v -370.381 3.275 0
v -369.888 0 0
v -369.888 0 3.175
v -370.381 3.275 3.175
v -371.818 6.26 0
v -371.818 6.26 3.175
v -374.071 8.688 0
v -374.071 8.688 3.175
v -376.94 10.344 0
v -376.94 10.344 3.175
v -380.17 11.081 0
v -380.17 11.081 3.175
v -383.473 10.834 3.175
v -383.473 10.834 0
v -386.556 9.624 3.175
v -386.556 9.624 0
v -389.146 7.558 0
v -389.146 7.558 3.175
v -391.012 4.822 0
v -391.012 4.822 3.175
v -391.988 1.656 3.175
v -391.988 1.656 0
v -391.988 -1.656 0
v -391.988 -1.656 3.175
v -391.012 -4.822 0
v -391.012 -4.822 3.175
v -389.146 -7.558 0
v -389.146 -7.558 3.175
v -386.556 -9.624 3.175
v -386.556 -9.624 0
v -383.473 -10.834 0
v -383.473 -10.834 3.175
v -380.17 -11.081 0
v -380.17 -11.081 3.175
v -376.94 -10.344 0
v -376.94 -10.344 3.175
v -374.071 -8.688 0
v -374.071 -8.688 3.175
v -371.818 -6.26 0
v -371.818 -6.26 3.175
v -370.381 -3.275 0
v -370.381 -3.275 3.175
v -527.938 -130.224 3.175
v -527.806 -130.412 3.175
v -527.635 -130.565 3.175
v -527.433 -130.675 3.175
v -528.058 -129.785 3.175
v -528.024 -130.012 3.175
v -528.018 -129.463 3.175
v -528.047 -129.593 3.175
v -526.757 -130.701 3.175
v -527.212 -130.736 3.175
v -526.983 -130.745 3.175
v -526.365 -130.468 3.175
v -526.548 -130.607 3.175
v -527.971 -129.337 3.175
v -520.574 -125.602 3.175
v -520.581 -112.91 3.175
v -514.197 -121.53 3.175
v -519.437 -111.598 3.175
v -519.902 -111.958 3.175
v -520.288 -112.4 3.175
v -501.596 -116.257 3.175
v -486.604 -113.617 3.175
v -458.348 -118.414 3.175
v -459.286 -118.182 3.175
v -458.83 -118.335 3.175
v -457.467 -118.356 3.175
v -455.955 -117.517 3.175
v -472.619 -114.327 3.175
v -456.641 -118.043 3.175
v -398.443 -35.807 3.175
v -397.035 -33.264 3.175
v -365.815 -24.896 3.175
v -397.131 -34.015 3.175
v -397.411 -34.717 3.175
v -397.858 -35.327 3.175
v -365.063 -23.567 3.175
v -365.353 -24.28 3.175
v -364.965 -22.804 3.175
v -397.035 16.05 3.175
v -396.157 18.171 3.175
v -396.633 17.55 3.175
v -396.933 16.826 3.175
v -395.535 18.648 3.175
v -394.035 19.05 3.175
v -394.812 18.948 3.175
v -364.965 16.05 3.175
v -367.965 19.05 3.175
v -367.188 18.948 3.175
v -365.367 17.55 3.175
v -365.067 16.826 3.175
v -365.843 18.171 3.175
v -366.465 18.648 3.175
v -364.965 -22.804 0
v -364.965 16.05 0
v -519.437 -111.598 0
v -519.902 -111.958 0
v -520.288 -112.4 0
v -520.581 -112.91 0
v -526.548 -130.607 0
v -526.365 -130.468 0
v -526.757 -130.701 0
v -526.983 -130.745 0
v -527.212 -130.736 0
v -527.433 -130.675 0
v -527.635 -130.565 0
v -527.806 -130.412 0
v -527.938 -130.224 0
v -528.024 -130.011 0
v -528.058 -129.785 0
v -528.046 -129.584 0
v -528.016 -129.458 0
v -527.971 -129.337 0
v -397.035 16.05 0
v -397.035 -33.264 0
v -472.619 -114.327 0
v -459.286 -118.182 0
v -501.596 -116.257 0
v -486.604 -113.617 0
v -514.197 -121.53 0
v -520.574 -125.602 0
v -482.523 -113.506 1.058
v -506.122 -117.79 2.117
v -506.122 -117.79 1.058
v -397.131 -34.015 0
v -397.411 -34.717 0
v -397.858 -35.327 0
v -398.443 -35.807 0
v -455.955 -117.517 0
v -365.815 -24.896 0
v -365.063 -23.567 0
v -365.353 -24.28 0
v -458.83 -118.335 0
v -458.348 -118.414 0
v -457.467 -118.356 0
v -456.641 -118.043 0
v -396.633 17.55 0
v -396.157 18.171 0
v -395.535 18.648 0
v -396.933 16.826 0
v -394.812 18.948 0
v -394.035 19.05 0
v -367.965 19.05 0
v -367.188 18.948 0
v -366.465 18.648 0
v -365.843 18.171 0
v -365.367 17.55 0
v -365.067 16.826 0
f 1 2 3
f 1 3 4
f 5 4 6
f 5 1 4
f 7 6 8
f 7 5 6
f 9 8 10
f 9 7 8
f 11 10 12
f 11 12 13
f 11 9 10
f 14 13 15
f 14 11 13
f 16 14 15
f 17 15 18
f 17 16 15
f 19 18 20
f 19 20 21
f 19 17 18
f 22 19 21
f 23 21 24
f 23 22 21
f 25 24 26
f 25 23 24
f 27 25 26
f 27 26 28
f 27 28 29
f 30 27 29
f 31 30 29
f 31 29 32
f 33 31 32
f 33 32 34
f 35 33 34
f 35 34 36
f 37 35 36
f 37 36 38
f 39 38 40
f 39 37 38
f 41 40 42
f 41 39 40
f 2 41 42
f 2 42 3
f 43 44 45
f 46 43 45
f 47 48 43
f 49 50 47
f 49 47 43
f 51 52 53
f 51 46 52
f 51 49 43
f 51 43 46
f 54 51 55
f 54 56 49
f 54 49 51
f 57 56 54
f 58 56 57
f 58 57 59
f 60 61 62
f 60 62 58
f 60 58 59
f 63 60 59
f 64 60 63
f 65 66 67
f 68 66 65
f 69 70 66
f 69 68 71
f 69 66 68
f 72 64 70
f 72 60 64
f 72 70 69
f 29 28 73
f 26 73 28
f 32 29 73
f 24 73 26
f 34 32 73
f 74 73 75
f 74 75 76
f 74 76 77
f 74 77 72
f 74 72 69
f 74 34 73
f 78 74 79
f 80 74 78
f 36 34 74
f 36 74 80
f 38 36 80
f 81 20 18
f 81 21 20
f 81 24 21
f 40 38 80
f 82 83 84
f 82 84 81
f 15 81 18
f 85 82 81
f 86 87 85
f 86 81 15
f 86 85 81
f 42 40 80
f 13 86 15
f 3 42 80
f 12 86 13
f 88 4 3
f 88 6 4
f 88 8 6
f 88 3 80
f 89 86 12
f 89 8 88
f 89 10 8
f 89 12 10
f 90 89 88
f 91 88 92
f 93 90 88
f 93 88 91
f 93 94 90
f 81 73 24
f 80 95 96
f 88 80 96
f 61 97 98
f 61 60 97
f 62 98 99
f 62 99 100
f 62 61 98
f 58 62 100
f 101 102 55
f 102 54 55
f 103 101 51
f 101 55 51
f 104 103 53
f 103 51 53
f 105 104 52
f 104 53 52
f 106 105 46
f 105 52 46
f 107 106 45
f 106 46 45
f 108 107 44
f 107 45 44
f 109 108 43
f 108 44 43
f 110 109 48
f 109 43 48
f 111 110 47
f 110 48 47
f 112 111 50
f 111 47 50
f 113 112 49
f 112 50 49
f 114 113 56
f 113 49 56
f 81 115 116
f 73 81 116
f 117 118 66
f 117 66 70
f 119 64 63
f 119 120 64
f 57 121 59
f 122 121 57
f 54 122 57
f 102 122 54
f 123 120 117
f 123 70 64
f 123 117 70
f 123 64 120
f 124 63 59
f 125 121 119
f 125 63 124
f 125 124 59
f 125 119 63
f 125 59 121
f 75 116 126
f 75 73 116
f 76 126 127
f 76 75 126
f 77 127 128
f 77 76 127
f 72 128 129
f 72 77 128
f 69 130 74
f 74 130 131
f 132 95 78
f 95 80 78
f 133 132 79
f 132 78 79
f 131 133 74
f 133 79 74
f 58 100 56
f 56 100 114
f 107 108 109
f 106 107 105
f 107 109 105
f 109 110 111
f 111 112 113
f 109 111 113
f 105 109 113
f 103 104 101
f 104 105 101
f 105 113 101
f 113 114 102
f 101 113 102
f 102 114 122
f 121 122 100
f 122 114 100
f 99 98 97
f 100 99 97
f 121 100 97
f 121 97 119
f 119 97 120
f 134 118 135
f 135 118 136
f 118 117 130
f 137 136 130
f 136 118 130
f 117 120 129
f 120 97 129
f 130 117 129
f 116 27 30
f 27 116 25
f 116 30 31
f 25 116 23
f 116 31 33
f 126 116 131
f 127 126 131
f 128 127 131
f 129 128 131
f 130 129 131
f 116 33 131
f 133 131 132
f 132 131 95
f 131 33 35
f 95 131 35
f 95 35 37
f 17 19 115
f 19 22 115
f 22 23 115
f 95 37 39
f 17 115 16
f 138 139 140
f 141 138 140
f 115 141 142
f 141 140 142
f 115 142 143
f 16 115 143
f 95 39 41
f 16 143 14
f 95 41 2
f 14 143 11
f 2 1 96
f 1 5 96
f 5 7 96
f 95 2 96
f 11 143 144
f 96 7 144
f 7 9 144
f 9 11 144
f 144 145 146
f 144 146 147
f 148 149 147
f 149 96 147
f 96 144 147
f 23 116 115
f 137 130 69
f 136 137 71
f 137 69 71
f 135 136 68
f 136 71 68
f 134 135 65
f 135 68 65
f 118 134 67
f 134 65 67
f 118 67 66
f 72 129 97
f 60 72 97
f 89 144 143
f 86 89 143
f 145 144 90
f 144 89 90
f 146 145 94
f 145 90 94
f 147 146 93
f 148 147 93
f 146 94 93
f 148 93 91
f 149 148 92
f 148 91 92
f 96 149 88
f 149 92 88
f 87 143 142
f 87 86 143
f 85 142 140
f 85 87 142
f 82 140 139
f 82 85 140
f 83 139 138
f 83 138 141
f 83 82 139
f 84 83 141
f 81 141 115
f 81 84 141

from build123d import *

# Parameters (mm, degrees)
SKETCH2_R           = 11.1125
BOSS_EXTRUDE1_DEPTH = 3.175
FILLET1_R           = 3
FILLET2_R           = 1


with BuildPart() as part:
    # Sketch2 → Boss-Extrude1 (new body)
    with BuildSketch(Plane.XY):
        with BuildLine():
            Line((-364.964629933, 19.05), (-397.035370067, 19.05))
            Line((-397.035370067, 19.05), (-397.035370067, -34.925))
            Line((-397.035370067, -34.925), (-520.207659615, -112.081032385))
            Line((-520.207659615, -112.081032385), (-530.464644327, -134.880029394))
            add(Edge.make_bspline(
                [(-457.420545856, -119.022880851), (-481.278146928, -107.716723517), (-513.288827873, -114.168548124), (-530.464644327, -134.880029394)],
                knots=[0.042886926, 0.042886926, 0.042886926, 0.042886926, 1, 1, 1, 1], degree=3))
            Line((-457.420545856, -119.022880851), (-364.964629933, -24.022670771))
            Line((-364.964629933, -24.022670771), (-364.964629933, 19.05))
        make_face()
        with Locations((-381, 0)):
            Circle(SKETCH2_R, mode=Mode.SUBTRACT)
    extrude(amount=BOSS_EXTRUDE1_DEPTH)

    # Fillet1
    fillet1_edges = [part.edges().sort_by_distance(p)[0] for p in [
        (-520.207659615, -112.081032385, 1.5875),
        (-397.035370067, -34.925, 1.5875),
        (-457.420545856, -119.022880851, 1.5875),
        (-364.964629933, -24.022670771, 1.5875),
        (-397.035370067, 19.05, 1.5875),
        (-364.964629933, 19.05, 1.5875),
    ]]
    fillet(fillet1_edges, radius=FILLET1_R)

    # Fillet2
    fillet2_edges = [part.edges().sort_by_distance(p)[0] for p in [
        (-530.464644327, -134.880029394, 1.5875),
    ]]
    fillet(fillet2_edges, radius=FILLET2_R)


solid = part.part
